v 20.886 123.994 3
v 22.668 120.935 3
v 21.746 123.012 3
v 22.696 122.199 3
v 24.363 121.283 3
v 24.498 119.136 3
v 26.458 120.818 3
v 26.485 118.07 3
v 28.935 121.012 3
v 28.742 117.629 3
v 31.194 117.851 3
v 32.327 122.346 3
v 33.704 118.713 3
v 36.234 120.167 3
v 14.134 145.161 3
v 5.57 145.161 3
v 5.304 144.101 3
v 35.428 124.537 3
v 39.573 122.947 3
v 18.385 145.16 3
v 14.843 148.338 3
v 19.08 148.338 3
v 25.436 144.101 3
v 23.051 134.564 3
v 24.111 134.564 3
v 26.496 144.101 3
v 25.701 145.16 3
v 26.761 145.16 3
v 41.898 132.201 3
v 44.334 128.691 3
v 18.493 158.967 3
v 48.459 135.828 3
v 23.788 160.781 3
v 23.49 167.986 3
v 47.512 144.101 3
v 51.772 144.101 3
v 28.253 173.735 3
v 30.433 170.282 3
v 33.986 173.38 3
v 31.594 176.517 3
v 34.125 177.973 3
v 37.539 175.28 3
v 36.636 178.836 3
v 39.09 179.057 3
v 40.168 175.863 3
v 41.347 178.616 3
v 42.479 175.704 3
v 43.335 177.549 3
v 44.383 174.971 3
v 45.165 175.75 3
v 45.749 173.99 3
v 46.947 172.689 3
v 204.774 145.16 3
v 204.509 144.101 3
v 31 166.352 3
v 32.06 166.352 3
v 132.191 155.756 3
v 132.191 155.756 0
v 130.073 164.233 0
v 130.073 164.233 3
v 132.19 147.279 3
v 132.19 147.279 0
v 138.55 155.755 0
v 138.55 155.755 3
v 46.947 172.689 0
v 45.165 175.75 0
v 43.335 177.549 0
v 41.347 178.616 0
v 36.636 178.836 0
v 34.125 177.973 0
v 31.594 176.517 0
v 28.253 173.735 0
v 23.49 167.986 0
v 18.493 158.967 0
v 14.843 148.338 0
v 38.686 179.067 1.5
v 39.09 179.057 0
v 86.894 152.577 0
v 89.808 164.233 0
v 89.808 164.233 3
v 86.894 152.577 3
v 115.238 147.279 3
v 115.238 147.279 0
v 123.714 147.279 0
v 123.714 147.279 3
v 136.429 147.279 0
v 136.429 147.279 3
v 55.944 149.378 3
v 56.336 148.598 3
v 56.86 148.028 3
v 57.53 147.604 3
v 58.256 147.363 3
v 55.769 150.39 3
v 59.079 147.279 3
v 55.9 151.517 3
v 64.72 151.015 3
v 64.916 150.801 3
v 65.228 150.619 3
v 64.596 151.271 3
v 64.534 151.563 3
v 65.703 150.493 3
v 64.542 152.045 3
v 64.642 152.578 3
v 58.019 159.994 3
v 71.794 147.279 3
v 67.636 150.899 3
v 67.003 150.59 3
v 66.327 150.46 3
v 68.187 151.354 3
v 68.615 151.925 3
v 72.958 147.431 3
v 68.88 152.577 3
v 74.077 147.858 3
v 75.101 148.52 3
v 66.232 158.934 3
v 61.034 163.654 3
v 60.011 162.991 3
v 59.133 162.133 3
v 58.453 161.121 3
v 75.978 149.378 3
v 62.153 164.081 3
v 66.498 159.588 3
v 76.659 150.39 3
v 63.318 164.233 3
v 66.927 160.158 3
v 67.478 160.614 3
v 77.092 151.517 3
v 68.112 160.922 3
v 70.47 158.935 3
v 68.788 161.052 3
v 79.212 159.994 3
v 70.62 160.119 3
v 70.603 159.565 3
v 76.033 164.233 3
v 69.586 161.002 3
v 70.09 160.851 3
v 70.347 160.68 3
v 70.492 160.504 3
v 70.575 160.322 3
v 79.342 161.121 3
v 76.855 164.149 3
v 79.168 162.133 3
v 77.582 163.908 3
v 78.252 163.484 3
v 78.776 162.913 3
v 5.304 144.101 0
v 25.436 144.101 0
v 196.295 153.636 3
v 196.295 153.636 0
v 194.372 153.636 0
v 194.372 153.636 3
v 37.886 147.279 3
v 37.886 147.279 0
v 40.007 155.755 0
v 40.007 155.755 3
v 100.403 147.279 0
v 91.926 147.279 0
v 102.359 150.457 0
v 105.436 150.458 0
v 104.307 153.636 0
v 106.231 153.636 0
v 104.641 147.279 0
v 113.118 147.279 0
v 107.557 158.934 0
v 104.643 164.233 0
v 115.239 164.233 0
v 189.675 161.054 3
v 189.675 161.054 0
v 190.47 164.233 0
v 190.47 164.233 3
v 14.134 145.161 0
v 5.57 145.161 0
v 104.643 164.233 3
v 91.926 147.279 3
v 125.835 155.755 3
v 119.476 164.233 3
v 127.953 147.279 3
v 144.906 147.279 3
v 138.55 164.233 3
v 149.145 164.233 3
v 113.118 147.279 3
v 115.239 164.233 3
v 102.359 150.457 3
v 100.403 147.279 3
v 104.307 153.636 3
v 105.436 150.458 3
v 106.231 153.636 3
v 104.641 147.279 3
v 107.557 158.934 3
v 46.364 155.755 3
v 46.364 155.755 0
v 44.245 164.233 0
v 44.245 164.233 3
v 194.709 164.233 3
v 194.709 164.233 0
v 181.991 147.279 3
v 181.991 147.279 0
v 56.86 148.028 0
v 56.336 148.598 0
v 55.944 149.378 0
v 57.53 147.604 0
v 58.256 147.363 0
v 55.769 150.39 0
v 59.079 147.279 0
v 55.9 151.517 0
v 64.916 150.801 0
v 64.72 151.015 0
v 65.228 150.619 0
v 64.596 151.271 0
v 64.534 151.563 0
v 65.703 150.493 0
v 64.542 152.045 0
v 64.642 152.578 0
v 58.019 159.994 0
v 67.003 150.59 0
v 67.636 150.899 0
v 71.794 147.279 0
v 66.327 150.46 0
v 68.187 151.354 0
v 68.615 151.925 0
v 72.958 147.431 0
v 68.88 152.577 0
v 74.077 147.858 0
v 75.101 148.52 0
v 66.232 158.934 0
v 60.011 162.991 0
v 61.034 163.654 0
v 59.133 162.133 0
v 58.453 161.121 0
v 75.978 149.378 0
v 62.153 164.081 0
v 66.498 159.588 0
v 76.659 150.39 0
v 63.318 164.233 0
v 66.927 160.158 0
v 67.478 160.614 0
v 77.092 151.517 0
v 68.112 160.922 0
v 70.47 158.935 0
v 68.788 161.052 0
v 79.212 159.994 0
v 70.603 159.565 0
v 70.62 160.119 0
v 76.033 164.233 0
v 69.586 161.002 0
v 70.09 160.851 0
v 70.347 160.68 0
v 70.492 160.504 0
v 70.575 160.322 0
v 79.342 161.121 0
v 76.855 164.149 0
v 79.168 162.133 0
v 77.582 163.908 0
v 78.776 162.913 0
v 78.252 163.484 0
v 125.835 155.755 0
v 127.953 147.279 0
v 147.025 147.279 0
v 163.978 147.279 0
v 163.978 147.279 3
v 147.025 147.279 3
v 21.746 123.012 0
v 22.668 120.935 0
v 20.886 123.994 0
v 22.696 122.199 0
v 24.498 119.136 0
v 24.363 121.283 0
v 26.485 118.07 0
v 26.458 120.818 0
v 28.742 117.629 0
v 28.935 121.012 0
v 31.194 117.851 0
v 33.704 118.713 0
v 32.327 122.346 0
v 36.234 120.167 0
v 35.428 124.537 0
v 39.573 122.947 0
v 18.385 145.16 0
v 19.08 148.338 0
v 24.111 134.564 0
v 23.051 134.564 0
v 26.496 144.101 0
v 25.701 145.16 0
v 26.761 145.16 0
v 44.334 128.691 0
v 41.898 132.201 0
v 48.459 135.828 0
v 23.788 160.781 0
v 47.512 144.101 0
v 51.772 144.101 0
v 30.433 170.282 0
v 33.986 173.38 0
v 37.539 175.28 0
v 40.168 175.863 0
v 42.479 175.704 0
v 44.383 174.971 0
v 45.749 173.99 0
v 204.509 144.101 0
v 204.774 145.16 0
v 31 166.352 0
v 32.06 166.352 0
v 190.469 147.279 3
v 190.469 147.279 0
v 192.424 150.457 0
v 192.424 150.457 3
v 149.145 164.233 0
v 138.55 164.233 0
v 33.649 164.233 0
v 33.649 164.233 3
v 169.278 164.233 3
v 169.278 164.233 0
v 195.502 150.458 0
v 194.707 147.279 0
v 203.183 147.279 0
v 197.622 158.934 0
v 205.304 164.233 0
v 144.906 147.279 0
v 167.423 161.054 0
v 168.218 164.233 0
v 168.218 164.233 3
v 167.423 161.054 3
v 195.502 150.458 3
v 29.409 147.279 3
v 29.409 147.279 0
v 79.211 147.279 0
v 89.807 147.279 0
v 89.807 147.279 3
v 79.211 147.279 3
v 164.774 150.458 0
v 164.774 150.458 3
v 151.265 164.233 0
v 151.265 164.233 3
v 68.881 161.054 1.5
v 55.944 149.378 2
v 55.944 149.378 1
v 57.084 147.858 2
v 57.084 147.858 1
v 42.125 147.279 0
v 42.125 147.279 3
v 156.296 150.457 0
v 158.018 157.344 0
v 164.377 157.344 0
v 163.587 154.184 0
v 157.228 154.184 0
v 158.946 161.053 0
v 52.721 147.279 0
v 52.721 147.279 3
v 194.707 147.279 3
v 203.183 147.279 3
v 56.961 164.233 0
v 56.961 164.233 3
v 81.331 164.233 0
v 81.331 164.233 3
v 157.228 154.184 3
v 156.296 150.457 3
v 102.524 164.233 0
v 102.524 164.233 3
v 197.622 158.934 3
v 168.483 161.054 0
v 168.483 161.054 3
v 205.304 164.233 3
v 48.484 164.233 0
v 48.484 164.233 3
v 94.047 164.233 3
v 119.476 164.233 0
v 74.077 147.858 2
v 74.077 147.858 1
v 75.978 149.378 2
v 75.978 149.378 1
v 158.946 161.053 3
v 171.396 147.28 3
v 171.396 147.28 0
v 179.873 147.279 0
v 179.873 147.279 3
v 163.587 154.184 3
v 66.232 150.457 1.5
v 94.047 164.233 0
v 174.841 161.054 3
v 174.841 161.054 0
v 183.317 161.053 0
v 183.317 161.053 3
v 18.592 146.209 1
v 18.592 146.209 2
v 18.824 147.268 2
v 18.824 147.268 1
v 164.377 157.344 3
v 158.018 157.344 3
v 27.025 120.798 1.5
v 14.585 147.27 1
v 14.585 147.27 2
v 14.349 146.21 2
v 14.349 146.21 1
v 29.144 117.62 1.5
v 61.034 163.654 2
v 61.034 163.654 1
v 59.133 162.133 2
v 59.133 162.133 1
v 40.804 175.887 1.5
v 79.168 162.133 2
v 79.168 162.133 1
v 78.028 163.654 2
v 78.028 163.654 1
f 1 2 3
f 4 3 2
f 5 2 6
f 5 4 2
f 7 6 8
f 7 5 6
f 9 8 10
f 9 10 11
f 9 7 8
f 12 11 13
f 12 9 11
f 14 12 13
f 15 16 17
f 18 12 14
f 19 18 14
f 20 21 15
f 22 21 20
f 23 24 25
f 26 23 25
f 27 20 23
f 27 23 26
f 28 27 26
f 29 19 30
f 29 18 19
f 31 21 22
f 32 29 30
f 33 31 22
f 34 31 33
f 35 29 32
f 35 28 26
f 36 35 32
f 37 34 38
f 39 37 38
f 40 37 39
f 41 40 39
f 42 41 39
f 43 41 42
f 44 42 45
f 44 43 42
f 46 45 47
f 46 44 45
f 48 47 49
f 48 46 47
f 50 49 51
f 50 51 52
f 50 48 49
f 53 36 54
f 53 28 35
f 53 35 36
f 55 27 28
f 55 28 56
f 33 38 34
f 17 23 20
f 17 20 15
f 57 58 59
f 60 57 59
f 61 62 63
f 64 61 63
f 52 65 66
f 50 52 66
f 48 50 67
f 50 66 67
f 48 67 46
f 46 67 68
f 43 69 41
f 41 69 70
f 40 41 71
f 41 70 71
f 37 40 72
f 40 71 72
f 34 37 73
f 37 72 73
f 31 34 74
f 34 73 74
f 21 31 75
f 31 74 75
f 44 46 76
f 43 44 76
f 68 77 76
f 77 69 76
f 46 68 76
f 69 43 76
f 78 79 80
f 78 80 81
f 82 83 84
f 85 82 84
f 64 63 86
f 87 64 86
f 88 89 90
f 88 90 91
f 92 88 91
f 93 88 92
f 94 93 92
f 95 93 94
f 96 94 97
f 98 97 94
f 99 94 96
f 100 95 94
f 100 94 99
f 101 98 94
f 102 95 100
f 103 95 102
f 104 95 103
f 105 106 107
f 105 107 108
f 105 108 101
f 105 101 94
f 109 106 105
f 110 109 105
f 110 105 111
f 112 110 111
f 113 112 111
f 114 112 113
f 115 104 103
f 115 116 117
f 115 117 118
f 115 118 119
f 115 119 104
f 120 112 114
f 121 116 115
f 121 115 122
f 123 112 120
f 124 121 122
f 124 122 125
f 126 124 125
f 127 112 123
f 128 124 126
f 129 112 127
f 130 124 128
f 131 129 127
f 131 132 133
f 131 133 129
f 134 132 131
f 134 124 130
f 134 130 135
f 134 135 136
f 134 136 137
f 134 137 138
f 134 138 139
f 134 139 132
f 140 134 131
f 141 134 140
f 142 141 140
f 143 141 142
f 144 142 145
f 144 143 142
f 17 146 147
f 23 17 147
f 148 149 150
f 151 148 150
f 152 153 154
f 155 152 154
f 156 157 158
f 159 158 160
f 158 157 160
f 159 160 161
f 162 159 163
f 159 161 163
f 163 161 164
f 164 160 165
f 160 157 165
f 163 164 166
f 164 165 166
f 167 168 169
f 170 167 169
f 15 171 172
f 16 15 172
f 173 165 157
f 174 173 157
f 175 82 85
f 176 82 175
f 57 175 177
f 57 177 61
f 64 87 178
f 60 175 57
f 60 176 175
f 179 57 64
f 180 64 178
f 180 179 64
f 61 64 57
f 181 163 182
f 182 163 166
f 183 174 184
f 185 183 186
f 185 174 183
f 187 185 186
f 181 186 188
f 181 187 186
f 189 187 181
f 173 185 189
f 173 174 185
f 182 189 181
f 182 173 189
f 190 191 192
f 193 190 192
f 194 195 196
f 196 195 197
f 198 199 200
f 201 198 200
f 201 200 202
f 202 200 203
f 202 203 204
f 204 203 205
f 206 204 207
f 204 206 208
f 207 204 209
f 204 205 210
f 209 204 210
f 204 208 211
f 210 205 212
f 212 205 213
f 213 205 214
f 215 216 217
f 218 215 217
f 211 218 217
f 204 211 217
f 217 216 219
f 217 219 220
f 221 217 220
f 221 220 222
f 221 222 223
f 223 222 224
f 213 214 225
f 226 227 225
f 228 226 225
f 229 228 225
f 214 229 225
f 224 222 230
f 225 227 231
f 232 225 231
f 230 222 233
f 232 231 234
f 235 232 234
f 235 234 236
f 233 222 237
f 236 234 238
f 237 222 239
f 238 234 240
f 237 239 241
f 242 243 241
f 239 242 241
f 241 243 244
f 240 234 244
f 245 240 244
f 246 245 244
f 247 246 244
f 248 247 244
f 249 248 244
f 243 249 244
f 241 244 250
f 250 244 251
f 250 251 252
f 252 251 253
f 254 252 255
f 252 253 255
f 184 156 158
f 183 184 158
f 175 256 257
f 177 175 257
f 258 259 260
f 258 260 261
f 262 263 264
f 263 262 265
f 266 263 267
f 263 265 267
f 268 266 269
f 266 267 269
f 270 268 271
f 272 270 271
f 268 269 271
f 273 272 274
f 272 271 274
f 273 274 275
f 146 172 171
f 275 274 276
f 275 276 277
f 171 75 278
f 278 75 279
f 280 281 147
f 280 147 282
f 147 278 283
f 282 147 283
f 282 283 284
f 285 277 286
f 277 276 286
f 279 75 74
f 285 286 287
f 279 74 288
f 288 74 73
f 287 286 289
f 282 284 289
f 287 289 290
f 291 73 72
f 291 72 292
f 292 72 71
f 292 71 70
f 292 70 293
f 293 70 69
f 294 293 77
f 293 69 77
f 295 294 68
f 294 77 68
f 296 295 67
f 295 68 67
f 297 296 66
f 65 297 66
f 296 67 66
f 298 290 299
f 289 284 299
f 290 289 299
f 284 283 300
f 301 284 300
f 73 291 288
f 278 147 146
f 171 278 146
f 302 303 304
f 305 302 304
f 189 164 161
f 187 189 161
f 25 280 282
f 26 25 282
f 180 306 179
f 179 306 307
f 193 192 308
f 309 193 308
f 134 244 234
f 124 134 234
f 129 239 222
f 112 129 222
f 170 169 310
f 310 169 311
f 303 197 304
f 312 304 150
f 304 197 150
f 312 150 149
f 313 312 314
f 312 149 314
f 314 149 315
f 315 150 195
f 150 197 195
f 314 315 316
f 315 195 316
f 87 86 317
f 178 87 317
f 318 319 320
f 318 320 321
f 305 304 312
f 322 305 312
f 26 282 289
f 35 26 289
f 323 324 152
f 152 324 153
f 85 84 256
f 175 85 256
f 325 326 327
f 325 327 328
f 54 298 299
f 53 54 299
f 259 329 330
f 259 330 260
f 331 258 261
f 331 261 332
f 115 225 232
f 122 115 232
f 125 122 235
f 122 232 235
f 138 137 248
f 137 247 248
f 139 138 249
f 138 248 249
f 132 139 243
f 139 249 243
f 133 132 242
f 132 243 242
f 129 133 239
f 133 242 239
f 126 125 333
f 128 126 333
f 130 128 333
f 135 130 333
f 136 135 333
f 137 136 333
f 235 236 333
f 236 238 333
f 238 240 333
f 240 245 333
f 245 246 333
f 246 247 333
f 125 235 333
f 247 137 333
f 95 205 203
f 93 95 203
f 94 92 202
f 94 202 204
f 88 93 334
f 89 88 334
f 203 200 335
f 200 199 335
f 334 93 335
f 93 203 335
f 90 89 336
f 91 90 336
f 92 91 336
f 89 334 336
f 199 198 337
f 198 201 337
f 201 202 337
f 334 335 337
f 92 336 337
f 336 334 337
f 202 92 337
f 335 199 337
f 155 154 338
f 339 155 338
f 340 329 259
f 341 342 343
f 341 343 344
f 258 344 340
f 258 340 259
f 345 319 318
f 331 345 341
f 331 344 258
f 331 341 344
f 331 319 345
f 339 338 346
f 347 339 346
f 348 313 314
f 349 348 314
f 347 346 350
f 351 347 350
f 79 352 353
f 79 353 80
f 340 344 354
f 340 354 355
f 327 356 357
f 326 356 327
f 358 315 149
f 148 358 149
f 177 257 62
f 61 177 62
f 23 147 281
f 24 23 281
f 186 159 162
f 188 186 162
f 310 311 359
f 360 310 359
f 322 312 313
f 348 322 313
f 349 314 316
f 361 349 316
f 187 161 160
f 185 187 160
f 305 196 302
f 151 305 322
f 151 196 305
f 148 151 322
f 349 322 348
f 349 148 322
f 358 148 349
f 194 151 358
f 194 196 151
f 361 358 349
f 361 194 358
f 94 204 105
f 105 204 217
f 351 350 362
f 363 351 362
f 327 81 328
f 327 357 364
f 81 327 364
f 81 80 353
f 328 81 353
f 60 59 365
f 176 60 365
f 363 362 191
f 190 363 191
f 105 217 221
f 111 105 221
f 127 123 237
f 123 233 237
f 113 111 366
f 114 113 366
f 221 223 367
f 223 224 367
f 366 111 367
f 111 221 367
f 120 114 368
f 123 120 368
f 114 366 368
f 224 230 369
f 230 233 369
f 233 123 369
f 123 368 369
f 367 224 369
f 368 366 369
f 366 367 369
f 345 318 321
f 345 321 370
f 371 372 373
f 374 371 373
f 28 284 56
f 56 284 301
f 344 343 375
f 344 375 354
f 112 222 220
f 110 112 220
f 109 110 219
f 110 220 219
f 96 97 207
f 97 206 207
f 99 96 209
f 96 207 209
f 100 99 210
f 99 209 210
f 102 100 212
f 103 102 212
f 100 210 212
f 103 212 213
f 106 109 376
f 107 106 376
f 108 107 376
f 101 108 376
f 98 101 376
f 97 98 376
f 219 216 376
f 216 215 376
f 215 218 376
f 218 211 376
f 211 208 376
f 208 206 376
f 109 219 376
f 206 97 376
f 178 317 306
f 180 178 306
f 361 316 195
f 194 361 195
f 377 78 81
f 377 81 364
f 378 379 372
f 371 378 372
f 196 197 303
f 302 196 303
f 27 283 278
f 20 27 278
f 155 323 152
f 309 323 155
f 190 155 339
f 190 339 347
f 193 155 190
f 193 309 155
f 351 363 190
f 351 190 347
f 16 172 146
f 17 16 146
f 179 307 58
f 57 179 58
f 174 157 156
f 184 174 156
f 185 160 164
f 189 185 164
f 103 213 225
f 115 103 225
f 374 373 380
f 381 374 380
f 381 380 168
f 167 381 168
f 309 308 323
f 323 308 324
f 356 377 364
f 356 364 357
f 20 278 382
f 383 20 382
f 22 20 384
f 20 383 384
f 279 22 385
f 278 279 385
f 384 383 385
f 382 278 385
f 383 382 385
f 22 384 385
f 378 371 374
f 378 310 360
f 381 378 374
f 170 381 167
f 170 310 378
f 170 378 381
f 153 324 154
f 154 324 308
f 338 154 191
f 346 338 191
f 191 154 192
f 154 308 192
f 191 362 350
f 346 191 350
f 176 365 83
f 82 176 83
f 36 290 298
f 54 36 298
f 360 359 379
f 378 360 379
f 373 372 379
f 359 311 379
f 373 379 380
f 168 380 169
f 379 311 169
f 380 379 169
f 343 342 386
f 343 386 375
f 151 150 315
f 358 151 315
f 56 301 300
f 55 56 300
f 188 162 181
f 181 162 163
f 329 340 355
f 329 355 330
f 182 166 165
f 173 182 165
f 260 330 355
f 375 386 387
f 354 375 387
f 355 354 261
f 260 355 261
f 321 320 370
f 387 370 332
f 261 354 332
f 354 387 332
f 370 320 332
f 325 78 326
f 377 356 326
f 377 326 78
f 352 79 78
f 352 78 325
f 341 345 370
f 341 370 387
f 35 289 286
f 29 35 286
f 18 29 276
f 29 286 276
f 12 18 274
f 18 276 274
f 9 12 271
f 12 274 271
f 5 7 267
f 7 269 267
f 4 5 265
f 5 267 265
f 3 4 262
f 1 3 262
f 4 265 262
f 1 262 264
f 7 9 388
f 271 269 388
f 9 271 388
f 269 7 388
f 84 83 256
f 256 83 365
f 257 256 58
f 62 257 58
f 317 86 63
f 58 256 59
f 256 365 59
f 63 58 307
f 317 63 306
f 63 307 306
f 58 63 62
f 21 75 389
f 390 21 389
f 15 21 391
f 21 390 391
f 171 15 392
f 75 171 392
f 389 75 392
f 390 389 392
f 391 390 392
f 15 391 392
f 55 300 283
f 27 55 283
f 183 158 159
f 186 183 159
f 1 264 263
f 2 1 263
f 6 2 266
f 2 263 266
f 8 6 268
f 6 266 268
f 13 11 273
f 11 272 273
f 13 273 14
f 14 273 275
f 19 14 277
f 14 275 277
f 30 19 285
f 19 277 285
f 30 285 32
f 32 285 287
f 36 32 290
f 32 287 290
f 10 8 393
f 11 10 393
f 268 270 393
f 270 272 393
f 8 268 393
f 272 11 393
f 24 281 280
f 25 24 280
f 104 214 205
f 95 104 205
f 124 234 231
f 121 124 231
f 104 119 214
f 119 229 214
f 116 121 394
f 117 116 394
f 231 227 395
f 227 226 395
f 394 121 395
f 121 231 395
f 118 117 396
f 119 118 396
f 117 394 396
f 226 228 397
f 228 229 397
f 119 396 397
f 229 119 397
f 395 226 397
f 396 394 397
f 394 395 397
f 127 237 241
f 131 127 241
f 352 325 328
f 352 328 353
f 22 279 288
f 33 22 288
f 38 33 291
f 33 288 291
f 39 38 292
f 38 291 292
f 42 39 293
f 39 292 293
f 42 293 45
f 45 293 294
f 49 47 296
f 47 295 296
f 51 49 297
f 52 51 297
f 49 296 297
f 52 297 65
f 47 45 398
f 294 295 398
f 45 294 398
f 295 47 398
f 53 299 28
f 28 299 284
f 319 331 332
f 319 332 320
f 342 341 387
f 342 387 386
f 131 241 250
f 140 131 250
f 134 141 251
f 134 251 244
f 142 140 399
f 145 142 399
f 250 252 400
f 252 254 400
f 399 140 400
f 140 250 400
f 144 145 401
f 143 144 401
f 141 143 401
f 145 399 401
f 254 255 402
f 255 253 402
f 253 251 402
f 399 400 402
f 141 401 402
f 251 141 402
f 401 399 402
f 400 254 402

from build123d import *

# Parameters (mm, degrees)
BOSS_EXTRUDE1_DEPTH   = 3
BOSS_EXTRUDE1_2_DEPTH = 3
BOSS_EXTRUDE1_3_DEPTH = 3
BOSS_EXTRUDE1_4_DEPTH = 3
BOSS_EXTRUDE1_5_DEPTH = 3
BOSS_EXTRUDE1_6_DEPTH = 3
BOSS_EXTRUDE1_7_DEPTH = 3
BOSS_EXTRUDE1_8_DEPTH = 3
BOSS_EXTRUDE1_9_DEPTH = 3


with BuildPart() as part:
    # Model → Boss-Extrude1 (new body)
    with BuildSketch(Plane.XY):
        Polygon((190.468994093, 147.279210033), (192.423741271, 150.456793853), (195.502278597, 150.458171892), (194.707495069, 147.279210033), (203.183463491, 147.278521014), (205.304264272, 164.232524916), (194.708528597, 164.232524916), (181.990614104, 147.278521014), align=None)
        Polygon((196.295339578, 153.635583458), (194.372287278, 153.635583458), (197.622045849, 158.934484824), align=None, mode=Mode.SUBTRACT)
    extrude(amount=BOSS_EXTRUDE1_DEPTH)


with BuildPart() as body_2:
    # Model → Boss-Extrude1 2 (new body)
    with BuildSketch(Plane.XY):
        Polygon((171.395911958, 147.279899052), (179.872913909, 147.279210033), (183.316631356, 161.053218547), (189.675244093, 161.053907566), (190.469683112, 164.232524916), (169.277522744, 164.232524916), (168.482739216, 161.053907566), (174.840662934, 161.053907566), align=None)
    extrude(amount=BOSS_EXTRUDE1_2_DEPTH)


with BuildPart() as body_3:
    # Model → Boss-Extrude1 3 (new body)
    with BuildSketch(Plane.XY):
        Polygon((147.024961986, 147.279210033), (151.264841, 164.232524916), (168.218155882, 164.232524916), (167.423372354, 161.053907566), (158.945681384, 161.053218547), (158.018261679, 157.344401002), (164.376874416, 157.344401002), (163.586914022, 154.183698149), (157.228301284, 154.183698149), (156.296402956, 150.456793853), (164.774093926, 150.458171892), (163.978276869, 147.278521014), align=None)
    extrude(amount=BOSS_EXTRUDE1_3_DEPTH)


with BuildPart() as body_4:
    # Model → Boss-Extrude1 4 (new body)
    with BuildSketch(Plane.XY):
        Polygon((149.145418257, 164.232524916), (138.549682583, 164.232524916), (132.191414355, 155.755695219), (130.073025141, 164.232524916), (119.476255938, 164.232524916), (115.237754963, 147.279210033), (123.713723385, 147.279210033), (125.834524166, 155.75535071), (127.95256887, 147.278521014), (132.190380826, 147.278521014), (138.549682583, 155.75535071), (136.428881802, 147.279210033), (144.905539243, 147.279210033), align=None)
    extrude(amount=BOSS_EXTRUDE1_4_DEPTH)


with BuildPart() as body_5:
    # Model → Boss-Extrude1 5 (new body)
    with BuildSketch(Plane.XY):
        Polygon((100.402829293, 147.279210033), (102.35861, 150.456793853), (105.436458307, 150.458171892), (104.641330269, 147.279210033), (113.117643201, 147.278521014), (115.238788491, 164.232524916), (104.642708307, 164.232524916), (91.926171852, 147.278521014), align=None)
        Polygon((106.230552816, 153.635583458), (104.307156007, 153.635583458), (107.556570069, 158.934484824), align=None, mode=Mode.SUBTRACT)
    extrude(amount=BOSS_EXTRUDE1_5_DEPTH)


with BuildPart() as body_6:
    # Model → Boss-Extrude1 6 (new body)
    with BuildSketch(Plane.XY):
        Polygon((89.807438129, 147.279210033), (79.211013435, 147.279210033), (81.331469706, 164.232524916), (89.807782638, 164.232524916), (86.893576367, 152.576561106), (94.046628123, 164.232524916), (102.523630074, 164.232524916), align=None)
    extrude(amount=BOSS_EXTRUDE1_6_DEPTH)


with BuildPart() as body_7:
    # Model → Boss-Extrude1 7 (new body)
    with BuildSketch(Plane.XY):
        Polygon((29.409402119, 147.278521014), (37.88640407, 147.278521014), (40.006515832, 155.75535071), (42.124560536, 147.278521014), (52.72064072, 147.278521014), (56.960519734, 164.232524916), (48.484206802, 164.232524916), (46.363750531, 155.75535071), (44.245361317, 164.232524916), (33.648936624, 164.232524916), align=None)
    extrude(amount=BOSS_EXTRUDE1_7_DEPTH)


with BuildPart() as body_8:
    # Model → Boss-Extrude1 8 (new body)
    with BuildSketch(Plane.XY):
        with BuildLine():
            Line((76.033257359, 164.232524916), (63.318098943, 164.232524916))
            add(Edge.make_bspline(
                [(63.318098943, 164.232524916), (60.976812051, 164.232524916), (58.605552828, 162.334794067), (58.019197577, 159.993851685)],
                knots=[1, 1, 1, 1, 2, 2, 2, 2], degree=3))
            Line((58.019197577, 159.993851685), (55.899774834, 151.516849734))
            add(Edge.make_bspline(
                [(55.899774834, 151.516849734), (55.314453111, 149.176596371), (56.737622056, 147.279210033), (59.078564438, 147.279210033)],
                knots=[3, 3, 3, 3, 4, 4, 4, 4], degree=3))
            Line((59.078564438, 147.279210033), (71.793722855, 147.279210033))
            add(Edge.make_bspline(
                [(71.793722855, 147.279210033), (74.134320728, 147.279210033), (76.50592446, 149.176596371), (77.092279712, 151.516849734)],
                knots=[5, 5, 5, 5, 6, 6, 6, 6], degree=3))
            Line((77.092279712, 151.516849734), (79.211702454, 159.993851685))
            add(Edge.make_bspline(
                [(79.211702454, 159.993851685), (79.797368687, 162.334794067), (78.374199742, 164.232524916), (76.033257359, 164.232524916)],
                knots=[7, 7, 7, 7, 8, 8, 8, 8], degree=3))
        make_face()
        with BuildLine():
            Line((64.642393647, 152.577594634), (66.231960704, 158.934484824))
            add(Edge.make_bspline(
                [(66.231960704, 158.934484824), (66.52479382, 160.104956015), (67.710251177, 161.053563057), (68.880894623, 161.053563057)],
                knots=[2, 2, 2, 2, 3, 3, 3, 3], degree=3))
            add(Edge.make_bspline(
                [(68.880894623, 161.053563057), (70.867681189, 161.053563057), (70.763294796, 160.105989543), (70.47011717, 158.935173843)],
                knots=[3, 3, 3, 3, 4, 4, 4, 4], degree=3))
            Line((70.47011717, 158.935173843), (68.880205603, 152.577250125))
            add(Edge.make_bspline(
                [(68.880205603, 152.577250125), (68.588061506, 151.406606679), (67.401570621, 150.457482873), (66.231616194, 150.457482873)],
                knots=[5, 5, 5, 5, 6, 6, 6, 6], degree=3))
            add(Edge.make_bspline(
                [(66.231616194, 150.457482873), (64.51010198, 150.457482873), (64.348527002, 151.40591766), (64.642393647, 152.577594634)],
                knots=[0, 0, 0, 0, 1, 1, 1, 1], degree=3))
        make_face(mode=Mode.SUBTRACT)
    extrude(amount=BOSS_EXTRUDE1_8_DEPTH)


with BuildPart() as body_9:
    # Model → Boss-Extrude1 9 (new body)
    with BuildSketch(Plane.XY):
        with BuildLine():
            Line((204.509480743, 144.100764938), (204.774064076, 145.160476309))
            Line((204.774064076, 145.160476309), (26.76081271, 145.160476309))
            Line((26.76081271, 145.160476309), (32.060403095, 166.351947658))
            Line((32.060403095, 166.351947658), (31.000347214, 166.351947658))
            Line((31.000347214, 166.351947658), (25.701445849, 145.160476309))
            Line((25.701445849, 145.160476309), (18.384752057, 145.160476309))
            add(Edge.make_bspline(
                [(18.384752057, 145.160476309), (18.58077799, 146.202962203), (18.811599388, 147.263362593), (19.080316836, 148.33806013)],
                knots=[6, 6, 6, 6, 7, 7, 7, 7], degree=3))
            add(Edge.make_bspline(
                [(19.080316836, 148.33806013), (22.885769309, 163.55366885), (32.612307392, 175.887455197), (40.804055437, 175.887455197)],
                knots=[7, 7, 7, 7, 8, 8, 8, 8], degree=3))
            add(Edge.make_bspline(
                [(40.804055437, 175.887455197), (43.313118479, 175.887455197), (45.386032432, 174.730075369), (46.947349706, 172.688511784)],
                knots=[8, 8, 8, 8, 9, 9, 9, 9], degree=3))
            add(Edge.make_bspline(
                [(46.947349706, 172.688511784), (45.219289811, 176.686889604), (42.397067589, 179.066761565), (38.686355242, 179.066761565)],
                knots=[9, 9, 9, 9, 10, 10, 10, 10], degree=3))
            add(Edge.make_bspline(
                [(38.686355242, 179.066761565), (29.762179897, 179.066761565), (19.086518007, 165.308772745), (14.842849389, 148.33840464)],
                knots=[10, 10, 10, 10, 11, 11, 11, 11], degree=3))
            add(Edge.make_bspline(
                [(14.842849389, 148.33840464), (14.57447645, 147.265429651), (14.33848741, 146.20502926), (14.134193247, 145.161165328)],
                knots=[11, 11, 11, 11, 12, 12, 12, 12], degree=3))
            Line((14.134193247, 145.161165328), (5.569685871, 145.161165328))
            Line((5.569685871, 145.161165328), (5.304413519, 144.100764938))
            Line((5.304413519, 144.100764938), (25.436173496, 144.100764938))
            Line((25.436173496, 144.100764938), (23.051478401, 134.564051616))
            Line((23.051478401, 134.564051616), (24.110845263, 134.564051616))
            Line((24.110845263, 134.564051616), (26.495884868, 144.100764938))
            Line((26.495884868, 144.100764938), (47.511656347, 144.100764938))
            add(Edge.make_bspline(
                [(47.511656347, 144.100764938), (43.111580393, 130.901915115), (34.441308585, 120.798139076), (27.025396044, 120.798139076)],
                knots=[19, 19, 19, 19, 20, 20, 20, 20], degree=3))
            add(Edge.make_bspline(
                [(27.025396044, 120.798139076), (24.518400059, 120.798139076), (22.446519634, 121.955691159), (20.885891379, 123.994498667)],
                knots=[20, 20, 20, 20, 21, 21, 21, 21], degree=3))
            add(Edge.make_bspline(
                [(20.885891379, 123.994498667), (22.613606765, 119.998187904), (25.435484477, 117.619693981), (29.144474277, 117.619693981)],
                knots=[21, 21, 21, 21, 22, 22, 22, 22], degree=3))
            add(Edge.make_bspline(
                [(29.144474277, 117.619693981), (37.311417634, 117.619693981), (46.943215592, 129.140093284), (51.771861424, 144.100764938)],
                knots=[22, 22, 22, 22, 23, 23, 23, 23], degree=3))
            Line((51.771861424, 144.100764938), (204.509480743, 144.100764938))
        make_face()
    extrude(amount=BOSS_EXTRUDE1_9_DEPTH)


solid = Compound([part.part, body_2.part, body_3.part, body_4.part, body_5.part, body_6.part, body_7.part, body_8.part, body_9.part])
